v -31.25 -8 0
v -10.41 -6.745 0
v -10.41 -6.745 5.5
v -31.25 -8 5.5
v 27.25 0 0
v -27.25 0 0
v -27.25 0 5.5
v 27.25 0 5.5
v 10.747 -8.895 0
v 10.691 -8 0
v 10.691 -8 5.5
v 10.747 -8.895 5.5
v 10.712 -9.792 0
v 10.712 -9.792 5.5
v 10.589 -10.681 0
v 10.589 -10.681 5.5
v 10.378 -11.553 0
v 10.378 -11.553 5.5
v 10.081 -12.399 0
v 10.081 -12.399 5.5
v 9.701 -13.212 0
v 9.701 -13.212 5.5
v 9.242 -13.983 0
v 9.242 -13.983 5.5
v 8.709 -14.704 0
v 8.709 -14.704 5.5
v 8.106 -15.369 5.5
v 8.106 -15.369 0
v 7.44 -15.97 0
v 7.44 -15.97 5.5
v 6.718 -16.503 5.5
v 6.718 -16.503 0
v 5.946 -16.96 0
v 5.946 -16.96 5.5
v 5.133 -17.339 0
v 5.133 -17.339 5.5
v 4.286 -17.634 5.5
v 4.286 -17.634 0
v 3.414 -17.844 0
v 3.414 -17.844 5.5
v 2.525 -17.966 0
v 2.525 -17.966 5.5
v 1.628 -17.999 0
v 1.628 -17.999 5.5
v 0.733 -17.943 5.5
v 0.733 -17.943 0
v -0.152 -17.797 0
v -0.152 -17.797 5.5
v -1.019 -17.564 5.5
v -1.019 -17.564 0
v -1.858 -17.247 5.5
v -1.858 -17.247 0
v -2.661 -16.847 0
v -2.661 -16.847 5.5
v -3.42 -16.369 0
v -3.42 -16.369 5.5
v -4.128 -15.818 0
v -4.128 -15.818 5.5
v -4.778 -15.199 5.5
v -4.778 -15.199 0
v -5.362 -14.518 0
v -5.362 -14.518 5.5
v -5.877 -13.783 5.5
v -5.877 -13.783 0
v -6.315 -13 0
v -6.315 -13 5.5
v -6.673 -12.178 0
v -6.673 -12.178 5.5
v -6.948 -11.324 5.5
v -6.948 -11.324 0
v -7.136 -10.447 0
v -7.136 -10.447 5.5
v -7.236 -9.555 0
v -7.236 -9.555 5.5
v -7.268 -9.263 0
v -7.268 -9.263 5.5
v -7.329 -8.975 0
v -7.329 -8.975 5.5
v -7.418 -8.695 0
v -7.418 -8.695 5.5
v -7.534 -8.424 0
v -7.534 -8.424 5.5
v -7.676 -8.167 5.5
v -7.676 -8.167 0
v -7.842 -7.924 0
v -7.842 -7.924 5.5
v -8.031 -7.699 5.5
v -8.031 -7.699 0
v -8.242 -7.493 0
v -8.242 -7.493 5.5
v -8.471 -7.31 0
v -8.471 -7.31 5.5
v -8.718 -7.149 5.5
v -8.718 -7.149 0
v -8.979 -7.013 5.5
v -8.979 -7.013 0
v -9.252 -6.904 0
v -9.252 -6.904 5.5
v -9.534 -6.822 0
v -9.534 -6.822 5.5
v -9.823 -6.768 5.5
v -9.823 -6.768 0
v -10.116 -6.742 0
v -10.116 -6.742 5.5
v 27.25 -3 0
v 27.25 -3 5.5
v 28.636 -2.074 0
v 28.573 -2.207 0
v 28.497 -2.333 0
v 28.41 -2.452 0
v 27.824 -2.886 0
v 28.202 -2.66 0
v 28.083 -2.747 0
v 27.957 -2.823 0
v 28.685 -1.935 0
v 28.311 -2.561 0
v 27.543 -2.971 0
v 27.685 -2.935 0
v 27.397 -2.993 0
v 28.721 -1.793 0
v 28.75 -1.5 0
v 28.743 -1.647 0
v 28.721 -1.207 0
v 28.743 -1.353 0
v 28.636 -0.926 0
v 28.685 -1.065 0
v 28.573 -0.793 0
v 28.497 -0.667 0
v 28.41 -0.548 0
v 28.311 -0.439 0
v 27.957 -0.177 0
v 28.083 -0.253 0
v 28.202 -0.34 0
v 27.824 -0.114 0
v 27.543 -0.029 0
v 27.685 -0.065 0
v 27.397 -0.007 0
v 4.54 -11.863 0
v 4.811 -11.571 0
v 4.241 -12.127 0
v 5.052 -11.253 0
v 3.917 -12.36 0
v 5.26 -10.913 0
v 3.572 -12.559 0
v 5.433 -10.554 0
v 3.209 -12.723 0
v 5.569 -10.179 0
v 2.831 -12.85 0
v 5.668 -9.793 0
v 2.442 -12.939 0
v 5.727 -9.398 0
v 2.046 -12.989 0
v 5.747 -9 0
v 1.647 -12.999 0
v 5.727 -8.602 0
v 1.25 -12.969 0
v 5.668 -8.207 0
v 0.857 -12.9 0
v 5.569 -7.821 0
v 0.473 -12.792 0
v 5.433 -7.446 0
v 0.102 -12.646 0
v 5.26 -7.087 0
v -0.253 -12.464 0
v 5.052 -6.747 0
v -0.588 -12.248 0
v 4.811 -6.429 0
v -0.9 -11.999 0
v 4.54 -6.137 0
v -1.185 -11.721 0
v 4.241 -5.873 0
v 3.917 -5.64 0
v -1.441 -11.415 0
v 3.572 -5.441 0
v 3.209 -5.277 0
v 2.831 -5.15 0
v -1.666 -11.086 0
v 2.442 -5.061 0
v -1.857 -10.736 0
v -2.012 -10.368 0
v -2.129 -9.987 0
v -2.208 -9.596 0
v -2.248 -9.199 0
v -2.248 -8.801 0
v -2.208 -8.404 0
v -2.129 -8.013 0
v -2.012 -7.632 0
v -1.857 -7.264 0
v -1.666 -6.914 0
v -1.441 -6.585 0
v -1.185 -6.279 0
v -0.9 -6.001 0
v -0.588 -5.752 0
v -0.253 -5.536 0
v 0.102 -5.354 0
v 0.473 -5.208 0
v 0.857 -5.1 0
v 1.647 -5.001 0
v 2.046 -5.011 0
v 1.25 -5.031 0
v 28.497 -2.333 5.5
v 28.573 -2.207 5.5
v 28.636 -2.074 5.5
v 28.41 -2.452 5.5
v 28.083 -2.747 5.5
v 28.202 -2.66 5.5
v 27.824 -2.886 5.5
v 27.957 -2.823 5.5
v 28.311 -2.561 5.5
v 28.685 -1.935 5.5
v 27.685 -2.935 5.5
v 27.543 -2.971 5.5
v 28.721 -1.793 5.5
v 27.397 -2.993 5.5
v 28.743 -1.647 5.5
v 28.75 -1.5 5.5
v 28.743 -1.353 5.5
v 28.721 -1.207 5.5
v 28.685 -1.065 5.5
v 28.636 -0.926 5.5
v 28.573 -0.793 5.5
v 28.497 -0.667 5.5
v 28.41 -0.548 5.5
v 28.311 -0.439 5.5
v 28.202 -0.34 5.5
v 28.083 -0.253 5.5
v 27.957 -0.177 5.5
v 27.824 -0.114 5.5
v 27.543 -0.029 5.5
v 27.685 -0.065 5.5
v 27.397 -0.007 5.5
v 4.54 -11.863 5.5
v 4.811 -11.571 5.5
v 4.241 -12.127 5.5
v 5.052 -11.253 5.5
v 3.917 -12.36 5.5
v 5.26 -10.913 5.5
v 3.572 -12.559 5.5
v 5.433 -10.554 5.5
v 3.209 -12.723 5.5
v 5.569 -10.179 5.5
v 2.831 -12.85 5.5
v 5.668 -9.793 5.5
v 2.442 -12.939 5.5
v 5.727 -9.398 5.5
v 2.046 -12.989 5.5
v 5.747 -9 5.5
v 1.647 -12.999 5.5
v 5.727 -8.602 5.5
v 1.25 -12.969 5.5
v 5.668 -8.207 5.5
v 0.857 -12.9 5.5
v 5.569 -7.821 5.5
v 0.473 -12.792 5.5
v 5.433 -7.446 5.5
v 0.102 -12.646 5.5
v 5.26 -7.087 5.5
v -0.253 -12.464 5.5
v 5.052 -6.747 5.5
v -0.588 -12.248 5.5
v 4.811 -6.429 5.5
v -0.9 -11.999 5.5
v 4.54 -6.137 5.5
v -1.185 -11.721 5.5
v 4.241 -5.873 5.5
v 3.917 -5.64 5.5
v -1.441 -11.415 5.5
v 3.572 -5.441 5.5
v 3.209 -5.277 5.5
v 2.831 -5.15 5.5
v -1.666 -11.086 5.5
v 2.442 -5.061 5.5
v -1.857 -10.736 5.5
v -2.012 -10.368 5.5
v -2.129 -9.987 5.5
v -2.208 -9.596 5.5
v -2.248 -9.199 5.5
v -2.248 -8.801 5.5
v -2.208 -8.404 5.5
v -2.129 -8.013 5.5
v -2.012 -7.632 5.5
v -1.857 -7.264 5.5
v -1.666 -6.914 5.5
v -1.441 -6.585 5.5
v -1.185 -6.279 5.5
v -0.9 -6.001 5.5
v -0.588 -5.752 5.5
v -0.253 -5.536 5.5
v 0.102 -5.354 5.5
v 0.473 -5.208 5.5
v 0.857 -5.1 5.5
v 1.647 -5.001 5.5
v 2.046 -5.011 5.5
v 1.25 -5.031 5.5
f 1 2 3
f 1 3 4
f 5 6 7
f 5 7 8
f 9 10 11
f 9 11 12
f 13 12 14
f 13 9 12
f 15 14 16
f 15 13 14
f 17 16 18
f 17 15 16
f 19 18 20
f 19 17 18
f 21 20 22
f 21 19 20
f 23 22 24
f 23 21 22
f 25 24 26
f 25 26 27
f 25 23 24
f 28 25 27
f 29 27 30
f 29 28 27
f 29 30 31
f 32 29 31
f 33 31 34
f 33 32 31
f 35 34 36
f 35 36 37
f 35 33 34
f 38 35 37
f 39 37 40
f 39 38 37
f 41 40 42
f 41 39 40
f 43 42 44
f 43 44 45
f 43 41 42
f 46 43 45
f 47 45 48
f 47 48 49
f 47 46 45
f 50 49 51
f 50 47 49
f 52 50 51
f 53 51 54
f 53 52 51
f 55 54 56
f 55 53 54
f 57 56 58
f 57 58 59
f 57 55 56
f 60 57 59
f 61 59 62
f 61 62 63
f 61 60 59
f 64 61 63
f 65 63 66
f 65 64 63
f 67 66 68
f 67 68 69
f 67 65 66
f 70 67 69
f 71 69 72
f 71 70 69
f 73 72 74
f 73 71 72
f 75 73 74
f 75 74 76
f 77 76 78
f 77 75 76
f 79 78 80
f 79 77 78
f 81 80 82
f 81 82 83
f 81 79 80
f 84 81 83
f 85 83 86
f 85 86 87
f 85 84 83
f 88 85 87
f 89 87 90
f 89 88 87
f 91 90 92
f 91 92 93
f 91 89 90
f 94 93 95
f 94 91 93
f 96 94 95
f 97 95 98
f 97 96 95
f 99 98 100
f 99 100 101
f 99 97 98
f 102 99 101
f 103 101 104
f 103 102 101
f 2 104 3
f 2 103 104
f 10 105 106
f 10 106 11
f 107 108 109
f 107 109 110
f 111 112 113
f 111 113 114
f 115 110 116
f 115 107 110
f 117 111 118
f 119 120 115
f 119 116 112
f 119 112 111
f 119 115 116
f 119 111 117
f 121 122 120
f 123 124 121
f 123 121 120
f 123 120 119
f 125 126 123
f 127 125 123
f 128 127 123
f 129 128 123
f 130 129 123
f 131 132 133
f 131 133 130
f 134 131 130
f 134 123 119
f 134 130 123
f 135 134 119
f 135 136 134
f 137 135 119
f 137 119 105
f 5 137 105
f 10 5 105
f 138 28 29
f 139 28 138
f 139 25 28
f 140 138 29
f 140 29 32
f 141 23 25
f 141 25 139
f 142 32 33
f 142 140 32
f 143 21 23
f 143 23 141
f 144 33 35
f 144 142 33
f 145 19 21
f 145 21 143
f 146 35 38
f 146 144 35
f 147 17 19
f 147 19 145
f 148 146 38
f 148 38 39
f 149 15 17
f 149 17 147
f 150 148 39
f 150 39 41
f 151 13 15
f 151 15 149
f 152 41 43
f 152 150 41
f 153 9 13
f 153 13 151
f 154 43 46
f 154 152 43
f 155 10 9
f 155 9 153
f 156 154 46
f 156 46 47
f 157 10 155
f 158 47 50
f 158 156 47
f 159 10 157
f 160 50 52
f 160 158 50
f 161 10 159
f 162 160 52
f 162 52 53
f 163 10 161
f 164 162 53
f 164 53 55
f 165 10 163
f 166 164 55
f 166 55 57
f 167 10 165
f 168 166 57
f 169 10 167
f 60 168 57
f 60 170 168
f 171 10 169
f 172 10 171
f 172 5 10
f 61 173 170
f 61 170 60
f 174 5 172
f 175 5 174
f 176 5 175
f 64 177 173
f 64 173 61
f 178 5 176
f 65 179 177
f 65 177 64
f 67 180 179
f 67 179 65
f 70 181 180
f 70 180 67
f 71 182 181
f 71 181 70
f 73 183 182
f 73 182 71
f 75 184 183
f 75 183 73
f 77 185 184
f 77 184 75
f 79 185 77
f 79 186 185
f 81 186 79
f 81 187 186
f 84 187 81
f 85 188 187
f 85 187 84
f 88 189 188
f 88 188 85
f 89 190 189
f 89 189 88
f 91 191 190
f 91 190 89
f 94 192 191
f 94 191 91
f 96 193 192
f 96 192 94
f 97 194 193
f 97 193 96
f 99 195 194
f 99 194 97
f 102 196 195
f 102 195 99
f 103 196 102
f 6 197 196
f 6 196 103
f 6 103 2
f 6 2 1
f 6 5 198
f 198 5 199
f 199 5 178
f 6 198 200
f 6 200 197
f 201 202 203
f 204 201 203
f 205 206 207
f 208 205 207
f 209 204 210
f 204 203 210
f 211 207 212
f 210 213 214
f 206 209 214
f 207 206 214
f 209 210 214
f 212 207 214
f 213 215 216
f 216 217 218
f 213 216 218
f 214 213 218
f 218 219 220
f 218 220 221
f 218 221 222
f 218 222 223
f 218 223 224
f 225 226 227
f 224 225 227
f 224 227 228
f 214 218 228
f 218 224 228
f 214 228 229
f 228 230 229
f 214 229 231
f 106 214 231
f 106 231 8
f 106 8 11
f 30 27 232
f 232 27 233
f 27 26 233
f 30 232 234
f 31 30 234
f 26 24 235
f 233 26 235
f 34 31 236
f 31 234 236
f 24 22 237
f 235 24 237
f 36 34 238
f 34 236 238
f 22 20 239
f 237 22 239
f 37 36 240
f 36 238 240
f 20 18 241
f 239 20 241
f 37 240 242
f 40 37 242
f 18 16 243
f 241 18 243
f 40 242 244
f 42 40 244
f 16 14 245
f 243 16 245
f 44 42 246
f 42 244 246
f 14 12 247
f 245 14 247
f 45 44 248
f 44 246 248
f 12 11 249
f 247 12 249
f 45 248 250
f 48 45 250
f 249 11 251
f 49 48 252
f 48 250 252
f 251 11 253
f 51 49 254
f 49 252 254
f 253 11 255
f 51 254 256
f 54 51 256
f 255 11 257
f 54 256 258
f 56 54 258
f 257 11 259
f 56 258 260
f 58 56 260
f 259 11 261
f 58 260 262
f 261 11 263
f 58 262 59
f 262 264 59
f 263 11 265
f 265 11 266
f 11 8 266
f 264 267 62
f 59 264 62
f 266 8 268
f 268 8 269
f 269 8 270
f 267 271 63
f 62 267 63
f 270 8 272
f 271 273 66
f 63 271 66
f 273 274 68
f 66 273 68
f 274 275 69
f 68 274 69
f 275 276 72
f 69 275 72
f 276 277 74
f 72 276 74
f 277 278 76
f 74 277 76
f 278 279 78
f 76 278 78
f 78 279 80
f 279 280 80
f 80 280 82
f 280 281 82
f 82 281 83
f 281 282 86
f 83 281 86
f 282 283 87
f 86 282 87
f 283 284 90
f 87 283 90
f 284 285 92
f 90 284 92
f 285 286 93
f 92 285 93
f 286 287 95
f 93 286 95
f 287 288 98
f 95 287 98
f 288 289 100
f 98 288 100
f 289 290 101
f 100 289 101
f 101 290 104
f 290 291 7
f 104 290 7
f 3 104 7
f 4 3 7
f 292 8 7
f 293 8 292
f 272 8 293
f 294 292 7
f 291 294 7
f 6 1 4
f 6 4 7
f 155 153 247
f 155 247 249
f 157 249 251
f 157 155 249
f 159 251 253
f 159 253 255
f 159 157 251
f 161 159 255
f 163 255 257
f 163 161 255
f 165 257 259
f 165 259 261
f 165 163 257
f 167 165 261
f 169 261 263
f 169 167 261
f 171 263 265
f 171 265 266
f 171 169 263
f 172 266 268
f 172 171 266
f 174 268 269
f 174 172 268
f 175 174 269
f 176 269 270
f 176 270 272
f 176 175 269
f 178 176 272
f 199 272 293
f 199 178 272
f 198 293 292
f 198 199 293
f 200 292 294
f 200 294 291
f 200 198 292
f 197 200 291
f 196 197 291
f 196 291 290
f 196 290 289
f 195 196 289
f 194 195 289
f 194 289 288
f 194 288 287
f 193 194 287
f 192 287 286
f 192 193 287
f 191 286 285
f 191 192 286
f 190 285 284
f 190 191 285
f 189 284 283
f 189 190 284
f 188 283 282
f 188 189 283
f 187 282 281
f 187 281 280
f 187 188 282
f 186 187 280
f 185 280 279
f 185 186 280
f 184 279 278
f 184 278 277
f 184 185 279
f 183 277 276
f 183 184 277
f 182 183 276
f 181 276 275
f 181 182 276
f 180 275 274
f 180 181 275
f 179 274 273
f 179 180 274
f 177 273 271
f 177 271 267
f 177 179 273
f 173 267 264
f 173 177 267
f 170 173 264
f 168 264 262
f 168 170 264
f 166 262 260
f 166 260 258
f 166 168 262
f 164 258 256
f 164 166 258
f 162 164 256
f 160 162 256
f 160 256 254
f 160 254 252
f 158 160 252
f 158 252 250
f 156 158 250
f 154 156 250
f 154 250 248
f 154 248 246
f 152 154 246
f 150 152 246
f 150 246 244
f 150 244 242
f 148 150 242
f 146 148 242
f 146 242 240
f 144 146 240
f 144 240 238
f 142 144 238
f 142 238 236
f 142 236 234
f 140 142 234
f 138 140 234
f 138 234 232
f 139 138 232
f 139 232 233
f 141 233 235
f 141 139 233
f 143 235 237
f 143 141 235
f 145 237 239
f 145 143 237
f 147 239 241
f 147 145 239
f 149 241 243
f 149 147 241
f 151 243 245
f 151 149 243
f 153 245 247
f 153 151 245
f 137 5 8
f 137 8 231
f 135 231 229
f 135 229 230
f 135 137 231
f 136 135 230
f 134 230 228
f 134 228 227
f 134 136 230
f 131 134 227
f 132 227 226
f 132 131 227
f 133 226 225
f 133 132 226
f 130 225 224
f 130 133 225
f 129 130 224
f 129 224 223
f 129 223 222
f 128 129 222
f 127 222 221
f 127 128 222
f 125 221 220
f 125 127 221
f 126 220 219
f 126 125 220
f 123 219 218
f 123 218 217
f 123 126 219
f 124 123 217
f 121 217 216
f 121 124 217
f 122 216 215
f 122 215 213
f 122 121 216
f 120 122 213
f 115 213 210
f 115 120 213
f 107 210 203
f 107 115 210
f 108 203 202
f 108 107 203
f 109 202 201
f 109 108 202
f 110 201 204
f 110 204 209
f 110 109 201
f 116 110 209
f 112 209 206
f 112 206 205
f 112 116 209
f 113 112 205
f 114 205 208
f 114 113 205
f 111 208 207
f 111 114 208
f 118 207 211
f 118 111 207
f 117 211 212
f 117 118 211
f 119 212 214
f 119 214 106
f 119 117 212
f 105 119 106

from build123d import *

# Parameters (mm, degrees)
SCHIZZO1_R                   = 4
ESTRUSIONE_ESTRUSIONE1_DEPTH = 5.5


with BuildPart() as part:
    # Schizzo1 → Estrusione-Estrusione1 (new body)
    with BuildSketch(Plane.XY):
        with BuildLine():
            Line((-27.25, 0), (27.25, 0))
            ThreePointArc((27.25, 0), (28.75, -1.5), (27.25, -3))
            Line((27.25, -3), (10.69143351, -8))
            ThreePointArc((10.69143351, -8), (2.524901098, -17.966332655), (-7.2357096, -9.555))
            ThreePointArc((-7.2357096, -9.555), (-8.241759605, -7.493469312), (-10.410277522, -6.745421563))
            Line((-10.410277522, -6.745421563), (-31.25, -8))
            Line((-31.25, -8), (-27.25, 0))
        make_face()
        with Locations((1.7471616, -9)):
            Circle(SCHIZZO1_R, mode=Mode.SUBTRACT)
    extrude(amount=ESTRUSIONE_ESTRUSIONE1_DEPTH)


solid = part.part
